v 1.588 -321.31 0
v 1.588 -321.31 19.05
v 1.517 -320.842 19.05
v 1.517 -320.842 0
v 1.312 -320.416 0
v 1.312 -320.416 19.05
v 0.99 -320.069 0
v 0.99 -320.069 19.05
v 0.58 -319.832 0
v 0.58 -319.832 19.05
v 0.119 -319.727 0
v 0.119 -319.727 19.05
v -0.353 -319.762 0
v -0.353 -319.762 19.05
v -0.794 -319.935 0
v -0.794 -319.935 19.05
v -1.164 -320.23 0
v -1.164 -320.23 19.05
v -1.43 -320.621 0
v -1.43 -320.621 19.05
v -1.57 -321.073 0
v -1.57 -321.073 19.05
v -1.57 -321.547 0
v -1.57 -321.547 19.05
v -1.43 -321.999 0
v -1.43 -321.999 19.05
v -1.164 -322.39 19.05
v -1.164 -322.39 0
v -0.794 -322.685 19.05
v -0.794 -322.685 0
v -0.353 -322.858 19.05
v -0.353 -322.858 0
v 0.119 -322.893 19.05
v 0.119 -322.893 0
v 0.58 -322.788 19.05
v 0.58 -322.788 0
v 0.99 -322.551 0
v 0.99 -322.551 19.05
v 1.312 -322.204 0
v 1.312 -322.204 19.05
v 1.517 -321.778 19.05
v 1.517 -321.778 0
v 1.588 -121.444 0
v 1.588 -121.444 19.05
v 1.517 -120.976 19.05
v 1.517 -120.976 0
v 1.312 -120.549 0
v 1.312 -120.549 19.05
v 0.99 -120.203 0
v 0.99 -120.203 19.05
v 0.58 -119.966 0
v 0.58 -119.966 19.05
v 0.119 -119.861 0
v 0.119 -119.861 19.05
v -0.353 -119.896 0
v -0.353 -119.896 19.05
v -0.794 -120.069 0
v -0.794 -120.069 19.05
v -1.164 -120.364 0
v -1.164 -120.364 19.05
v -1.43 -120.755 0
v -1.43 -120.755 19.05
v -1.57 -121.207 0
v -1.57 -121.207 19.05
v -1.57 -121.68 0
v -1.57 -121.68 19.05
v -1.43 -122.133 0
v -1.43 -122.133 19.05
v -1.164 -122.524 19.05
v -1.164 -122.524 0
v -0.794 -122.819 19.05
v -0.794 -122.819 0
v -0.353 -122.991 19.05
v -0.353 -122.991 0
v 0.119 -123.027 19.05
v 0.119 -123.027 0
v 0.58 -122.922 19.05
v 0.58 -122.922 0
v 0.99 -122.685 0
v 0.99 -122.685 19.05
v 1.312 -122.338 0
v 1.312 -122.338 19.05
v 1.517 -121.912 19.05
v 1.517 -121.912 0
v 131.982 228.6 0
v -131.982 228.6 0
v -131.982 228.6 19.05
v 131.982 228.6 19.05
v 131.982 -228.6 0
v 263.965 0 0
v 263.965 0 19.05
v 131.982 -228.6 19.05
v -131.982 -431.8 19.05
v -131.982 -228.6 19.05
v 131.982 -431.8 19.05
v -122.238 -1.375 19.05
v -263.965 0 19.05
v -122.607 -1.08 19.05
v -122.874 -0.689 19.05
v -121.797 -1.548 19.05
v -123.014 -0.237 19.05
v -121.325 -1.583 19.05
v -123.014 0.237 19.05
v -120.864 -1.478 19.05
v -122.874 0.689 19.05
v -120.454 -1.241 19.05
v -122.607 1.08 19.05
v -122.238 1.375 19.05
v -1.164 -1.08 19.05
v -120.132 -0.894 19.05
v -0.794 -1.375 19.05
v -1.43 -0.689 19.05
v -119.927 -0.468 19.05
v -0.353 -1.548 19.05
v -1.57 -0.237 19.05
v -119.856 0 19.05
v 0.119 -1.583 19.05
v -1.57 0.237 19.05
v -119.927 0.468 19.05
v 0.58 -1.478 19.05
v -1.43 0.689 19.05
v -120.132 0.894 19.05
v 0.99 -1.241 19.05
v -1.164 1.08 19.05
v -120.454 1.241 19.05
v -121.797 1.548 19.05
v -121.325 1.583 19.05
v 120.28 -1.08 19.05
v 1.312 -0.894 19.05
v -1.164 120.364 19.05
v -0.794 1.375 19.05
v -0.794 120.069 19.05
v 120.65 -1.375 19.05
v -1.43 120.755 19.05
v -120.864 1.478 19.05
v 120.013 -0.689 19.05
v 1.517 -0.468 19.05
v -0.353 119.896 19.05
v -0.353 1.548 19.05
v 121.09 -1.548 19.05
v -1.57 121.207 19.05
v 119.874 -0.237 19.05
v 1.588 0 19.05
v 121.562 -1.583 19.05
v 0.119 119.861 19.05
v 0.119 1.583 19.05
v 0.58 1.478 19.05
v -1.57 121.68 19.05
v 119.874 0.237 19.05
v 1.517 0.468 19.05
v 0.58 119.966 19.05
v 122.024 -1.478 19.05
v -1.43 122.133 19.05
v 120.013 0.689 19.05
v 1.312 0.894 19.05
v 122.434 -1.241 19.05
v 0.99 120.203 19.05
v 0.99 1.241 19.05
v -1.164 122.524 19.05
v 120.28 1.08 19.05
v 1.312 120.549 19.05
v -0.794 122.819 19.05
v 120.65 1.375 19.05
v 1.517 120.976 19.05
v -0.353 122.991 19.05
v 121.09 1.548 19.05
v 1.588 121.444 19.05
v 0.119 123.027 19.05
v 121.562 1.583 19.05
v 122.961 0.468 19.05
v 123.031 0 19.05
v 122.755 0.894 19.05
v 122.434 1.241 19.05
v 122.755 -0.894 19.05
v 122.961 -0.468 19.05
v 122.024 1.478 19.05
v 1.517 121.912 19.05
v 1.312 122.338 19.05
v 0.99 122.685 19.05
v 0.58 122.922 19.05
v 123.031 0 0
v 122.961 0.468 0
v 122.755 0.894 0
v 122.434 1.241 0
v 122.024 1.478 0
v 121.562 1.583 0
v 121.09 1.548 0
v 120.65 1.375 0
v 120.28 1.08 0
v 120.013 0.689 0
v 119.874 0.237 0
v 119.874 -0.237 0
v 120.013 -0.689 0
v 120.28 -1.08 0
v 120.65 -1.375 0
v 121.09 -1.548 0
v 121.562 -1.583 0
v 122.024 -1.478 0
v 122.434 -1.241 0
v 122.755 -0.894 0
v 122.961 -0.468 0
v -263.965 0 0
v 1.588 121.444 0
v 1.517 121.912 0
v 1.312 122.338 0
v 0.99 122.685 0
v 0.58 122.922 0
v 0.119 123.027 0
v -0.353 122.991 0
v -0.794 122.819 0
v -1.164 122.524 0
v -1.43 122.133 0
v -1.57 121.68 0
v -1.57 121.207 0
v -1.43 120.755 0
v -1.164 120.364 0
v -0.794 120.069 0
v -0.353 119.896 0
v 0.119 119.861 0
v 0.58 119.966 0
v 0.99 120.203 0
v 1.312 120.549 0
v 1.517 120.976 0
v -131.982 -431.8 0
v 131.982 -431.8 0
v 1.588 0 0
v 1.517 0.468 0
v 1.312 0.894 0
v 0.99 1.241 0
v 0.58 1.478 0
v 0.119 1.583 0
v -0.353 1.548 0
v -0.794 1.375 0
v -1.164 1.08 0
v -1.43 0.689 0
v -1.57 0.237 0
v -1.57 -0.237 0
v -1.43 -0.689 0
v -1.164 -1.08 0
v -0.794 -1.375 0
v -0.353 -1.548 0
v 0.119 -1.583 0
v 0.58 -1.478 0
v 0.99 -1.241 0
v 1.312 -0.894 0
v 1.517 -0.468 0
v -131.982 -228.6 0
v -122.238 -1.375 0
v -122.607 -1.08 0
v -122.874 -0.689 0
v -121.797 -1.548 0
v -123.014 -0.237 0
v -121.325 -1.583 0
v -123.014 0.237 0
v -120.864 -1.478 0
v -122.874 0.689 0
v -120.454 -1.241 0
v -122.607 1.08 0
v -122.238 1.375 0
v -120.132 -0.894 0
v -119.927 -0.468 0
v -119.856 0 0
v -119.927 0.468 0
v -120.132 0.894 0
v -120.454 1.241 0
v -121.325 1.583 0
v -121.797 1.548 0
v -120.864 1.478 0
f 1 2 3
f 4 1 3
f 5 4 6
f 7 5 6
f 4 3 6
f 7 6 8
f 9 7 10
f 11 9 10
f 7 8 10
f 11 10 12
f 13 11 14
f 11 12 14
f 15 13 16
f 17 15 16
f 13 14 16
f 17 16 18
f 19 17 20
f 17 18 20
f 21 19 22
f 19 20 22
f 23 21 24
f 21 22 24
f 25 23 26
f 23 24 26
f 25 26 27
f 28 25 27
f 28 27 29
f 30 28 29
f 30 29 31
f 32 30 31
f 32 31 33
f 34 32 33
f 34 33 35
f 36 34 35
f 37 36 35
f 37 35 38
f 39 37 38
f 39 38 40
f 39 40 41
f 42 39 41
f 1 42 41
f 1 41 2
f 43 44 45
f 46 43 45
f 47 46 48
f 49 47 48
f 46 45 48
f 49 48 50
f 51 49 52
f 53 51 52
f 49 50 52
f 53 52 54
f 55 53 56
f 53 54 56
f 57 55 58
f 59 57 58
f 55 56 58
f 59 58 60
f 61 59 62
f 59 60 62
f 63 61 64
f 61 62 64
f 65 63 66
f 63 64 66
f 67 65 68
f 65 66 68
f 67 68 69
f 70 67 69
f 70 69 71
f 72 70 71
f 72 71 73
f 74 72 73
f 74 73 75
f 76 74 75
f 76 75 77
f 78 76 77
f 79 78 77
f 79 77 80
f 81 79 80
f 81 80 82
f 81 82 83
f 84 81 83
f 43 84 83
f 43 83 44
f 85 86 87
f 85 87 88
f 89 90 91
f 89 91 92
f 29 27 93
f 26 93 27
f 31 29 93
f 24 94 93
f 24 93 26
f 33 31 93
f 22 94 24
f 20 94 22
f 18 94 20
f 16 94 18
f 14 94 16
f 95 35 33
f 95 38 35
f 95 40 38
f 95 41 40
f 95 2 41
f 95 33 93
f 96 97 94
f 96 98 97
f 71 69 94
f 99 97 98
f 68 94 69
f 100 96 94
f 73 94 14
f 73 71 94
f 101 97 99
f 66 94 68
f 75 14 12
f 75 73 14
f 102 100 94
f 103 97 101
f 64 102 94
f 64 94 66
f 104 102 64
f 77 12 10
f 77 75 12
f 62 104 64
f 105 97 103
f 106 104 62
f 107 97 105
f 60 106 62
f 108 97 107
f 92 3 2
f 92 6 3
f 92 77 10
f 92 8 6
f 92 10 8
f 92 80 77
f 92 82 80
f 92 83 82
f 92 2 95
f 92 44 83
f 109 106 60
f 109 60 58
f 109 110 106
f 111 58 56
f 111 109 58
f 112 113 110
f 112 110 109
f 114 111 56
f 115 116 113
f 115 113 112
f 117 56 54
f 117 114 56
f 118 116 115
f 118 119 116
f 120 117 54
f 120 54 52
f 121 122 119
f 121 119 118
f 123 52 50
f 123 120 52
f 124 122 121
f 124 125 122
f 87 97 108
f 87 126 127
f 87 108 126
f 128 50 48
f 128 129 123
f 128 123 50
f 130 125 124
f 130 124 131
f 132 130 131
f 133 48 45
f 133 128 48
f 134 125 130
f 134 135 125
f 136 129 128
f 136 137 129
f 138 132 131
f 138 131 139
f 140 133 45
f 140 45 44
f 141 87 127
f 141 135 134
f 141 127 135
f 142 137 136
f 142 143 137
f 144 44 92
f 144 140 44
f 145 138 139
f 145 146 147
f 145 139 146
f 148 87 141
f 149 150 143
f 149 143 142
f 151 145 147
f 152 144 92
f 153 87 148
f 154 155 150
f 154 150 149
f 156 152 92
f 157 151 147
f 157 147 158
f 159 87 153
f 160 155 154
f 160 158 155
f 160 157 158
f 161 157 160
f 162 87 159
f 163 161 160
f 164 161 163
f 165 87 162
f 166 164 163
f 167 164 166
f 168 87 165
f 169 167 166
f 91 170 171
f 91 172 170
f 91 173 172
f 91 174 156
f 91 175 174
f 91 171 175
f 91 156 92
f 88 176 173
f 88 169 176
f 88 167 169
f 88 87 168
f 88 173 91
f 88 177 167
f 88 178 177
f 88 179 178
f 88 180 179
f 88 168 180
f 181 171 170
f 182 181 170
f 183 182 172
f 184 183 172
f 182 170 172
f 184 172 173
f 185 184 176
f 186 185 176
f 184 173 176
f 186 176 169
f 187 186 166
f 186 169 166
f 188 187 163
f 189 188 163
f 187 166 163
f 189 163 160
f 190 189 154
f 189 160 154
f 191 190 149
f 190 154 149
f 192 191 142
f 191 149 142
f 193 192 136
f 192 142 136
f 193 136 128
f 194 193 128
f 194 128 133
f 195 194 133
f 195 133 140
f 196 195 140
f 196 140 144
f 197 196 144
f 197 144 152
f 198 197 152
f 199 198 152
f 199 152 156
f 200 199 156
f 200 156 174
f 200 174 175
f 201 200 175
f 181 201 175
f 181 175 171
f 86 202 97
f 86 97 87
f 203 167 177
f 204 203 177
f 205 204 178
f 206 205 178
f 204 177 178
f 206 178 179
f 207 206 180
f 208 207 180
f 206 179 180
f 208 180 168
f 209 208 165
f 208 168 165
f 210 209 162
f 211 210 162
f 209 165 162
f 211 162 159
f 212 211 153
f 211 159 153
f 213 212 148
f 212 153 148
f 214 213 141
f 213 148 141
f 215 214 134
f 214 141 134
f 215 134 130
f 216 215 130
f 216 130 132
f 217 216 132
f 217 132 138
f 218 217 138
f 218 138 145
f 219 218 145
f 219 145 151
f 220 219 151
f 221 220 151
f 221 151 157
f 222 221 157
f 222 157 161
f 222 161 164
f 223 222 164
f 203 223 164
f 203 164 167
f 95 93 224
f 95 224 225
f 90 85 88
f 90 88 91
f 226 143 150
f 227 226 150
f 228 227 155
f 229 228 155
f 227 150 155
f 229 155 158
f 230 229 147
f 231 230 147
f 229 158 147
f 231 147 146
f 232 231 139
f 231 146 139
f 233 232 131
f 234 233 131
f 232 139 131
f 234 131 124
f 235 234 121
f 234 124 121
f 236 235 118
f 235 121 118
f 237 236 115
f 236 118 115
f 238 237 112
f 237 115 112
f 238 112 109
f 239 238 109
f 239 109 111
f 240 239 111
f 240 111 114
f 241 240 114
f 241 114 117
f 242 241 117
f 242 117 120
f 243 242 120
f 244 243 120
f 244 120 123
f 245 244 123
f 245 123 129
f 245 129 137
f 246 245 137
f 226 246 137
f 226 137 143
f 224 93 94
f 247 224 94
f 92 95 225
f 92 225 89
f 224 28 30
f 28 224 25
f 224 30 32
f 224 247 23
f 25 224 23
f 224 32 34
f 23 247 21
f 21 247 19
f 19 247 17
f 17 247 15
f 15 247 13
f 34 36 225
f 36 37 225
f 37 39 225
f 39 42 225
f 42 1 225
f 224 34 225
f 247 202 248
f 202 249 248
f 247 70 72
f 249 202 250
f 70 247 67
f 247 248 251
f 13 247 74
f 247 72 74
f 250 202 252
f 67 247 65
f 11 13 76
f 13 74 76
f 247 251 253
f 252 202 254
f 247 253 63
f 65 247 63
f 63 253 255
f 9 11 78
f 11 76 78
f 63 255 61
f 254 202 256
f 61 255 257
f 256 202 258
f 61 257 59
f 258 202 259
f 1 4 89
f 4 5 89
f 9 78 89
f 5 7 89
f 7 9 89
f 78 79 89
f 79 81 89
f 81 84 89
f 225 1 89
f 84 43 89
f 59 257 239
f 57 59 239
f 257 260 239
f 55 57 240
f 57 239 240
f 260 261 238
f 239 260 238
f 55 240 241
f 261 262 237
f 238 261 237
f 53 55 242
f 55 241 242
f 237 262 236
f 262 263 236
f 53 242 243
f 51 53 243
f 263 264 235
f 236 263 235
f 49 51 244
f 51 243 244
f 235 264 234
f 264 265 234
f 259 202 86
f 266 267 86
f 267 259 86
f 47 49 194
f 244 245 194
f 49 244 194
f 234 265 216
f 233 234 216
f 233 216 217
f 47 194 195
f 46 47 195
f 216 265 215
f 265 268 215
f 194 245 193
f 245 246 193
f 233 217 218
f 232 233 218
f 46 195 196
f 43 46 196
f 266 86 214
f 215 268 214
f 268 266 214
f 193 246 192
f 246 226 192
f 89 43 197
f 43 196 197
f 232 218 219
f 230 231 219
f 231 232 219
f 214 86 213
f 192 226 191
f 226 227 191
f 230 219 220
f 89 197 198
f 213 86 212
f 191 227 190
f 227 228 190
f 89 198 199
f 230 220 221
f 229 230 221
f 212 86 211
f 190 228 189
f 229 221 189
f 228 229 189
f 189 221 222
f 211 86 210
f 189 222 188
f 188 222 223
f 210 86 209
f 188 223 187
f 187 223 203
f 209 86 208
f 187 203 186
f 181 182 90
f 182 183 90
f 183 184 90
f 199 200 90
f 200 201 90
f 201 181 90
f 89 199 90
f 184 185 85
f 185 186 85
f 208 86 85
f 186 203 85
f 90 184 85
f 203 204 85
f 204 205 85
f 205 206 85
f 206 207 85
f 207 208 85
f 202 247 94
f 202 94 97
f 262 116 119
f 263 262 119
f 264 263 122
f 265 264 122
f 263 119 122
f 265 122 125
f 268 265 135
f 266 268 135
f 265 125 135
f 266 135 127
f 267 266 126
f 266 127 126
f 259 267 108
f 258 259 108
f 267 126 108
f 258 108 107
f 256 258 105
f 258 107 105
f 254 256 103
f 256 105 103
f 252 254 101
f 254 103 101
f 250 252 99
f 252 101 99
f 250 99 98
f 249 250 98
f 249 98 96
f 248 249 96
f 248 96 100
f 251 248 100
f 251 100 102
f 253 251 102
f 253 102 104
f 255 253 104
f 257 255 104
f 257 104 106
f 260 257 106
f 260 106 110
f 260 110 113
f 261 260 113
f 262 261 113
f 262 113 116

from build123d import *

# Parameters (mm, degrees)
BOSS_EXTRUDE1_DEPTH = 19.05
SKETCH2_W           = 263.964543074
SKETCH2_H           = 203.2
BOSS_EXTRUDE2_DEPTH = 19.05
SKETCH4_R           = 1.5875
CUT_EXTRUDE1_DEPTH  = 507.449822292
SKETCH5_R           = 1.5875
CUT_EXTRUDE2_DEPTH  = 507.449822292


with BuildPart() as part:
    # Sketch1 → Boss-Extrude1 (new body)
    with BuildSketch(Plane.XY):
        Polygon((-131.982271537, 228.6), (131.982271537, 228.6), (263.964543073, 0), (131.982271537, -228.6), (-131.982271537, -228.6), (-263.964543073, 0), align=None)
    extrude(amount=BOSS_EXTRUDE1_DEPTH)

    # Sketch2 → Boss-Extrude2 (add)
    with BuildSketch(Plane.XY.offset(19.05)):
        with Locations((0, -330.2)):
            Rectangle(SKETCH2_W, SKETCH2_H)
    extrude(amount=-BOSS_EXTRUDE2_DEPTH)

    # Sketch4 → Cut-Extrude1 (cut, through all)
    with BuildSketch(Plane.XY.offset(19.05)):
        Circle(SKETCH4_R)
        with Locations((0, -321.31)):
            Circle(SKETCH4_R)
    extrude(amount=-CUT_EXTRUDE1_DEPTH, mode=Mode.SUBTRACT)

    # Sketch5 → Cut-Extrude2 (cut, through all)
    with BuildSketch(Plane.XY.offset(19.05)):
        with Locations((-121.44375, 0)):
            Circle(SKETCH5_R)
        with Locations((0, 121.44375)):
            Circle(SKETCH5_R)
        with Locations((121.44375, 0)):
            Circle(SKETCH5_R)
        with Locations((0, -121.44375)):
            Circle(SKETCH5_R)
    extrude(amount=-CUT_EXTRUDE2_DEPTH, mode=Mode.SUBTRACT)


solid = part.part
